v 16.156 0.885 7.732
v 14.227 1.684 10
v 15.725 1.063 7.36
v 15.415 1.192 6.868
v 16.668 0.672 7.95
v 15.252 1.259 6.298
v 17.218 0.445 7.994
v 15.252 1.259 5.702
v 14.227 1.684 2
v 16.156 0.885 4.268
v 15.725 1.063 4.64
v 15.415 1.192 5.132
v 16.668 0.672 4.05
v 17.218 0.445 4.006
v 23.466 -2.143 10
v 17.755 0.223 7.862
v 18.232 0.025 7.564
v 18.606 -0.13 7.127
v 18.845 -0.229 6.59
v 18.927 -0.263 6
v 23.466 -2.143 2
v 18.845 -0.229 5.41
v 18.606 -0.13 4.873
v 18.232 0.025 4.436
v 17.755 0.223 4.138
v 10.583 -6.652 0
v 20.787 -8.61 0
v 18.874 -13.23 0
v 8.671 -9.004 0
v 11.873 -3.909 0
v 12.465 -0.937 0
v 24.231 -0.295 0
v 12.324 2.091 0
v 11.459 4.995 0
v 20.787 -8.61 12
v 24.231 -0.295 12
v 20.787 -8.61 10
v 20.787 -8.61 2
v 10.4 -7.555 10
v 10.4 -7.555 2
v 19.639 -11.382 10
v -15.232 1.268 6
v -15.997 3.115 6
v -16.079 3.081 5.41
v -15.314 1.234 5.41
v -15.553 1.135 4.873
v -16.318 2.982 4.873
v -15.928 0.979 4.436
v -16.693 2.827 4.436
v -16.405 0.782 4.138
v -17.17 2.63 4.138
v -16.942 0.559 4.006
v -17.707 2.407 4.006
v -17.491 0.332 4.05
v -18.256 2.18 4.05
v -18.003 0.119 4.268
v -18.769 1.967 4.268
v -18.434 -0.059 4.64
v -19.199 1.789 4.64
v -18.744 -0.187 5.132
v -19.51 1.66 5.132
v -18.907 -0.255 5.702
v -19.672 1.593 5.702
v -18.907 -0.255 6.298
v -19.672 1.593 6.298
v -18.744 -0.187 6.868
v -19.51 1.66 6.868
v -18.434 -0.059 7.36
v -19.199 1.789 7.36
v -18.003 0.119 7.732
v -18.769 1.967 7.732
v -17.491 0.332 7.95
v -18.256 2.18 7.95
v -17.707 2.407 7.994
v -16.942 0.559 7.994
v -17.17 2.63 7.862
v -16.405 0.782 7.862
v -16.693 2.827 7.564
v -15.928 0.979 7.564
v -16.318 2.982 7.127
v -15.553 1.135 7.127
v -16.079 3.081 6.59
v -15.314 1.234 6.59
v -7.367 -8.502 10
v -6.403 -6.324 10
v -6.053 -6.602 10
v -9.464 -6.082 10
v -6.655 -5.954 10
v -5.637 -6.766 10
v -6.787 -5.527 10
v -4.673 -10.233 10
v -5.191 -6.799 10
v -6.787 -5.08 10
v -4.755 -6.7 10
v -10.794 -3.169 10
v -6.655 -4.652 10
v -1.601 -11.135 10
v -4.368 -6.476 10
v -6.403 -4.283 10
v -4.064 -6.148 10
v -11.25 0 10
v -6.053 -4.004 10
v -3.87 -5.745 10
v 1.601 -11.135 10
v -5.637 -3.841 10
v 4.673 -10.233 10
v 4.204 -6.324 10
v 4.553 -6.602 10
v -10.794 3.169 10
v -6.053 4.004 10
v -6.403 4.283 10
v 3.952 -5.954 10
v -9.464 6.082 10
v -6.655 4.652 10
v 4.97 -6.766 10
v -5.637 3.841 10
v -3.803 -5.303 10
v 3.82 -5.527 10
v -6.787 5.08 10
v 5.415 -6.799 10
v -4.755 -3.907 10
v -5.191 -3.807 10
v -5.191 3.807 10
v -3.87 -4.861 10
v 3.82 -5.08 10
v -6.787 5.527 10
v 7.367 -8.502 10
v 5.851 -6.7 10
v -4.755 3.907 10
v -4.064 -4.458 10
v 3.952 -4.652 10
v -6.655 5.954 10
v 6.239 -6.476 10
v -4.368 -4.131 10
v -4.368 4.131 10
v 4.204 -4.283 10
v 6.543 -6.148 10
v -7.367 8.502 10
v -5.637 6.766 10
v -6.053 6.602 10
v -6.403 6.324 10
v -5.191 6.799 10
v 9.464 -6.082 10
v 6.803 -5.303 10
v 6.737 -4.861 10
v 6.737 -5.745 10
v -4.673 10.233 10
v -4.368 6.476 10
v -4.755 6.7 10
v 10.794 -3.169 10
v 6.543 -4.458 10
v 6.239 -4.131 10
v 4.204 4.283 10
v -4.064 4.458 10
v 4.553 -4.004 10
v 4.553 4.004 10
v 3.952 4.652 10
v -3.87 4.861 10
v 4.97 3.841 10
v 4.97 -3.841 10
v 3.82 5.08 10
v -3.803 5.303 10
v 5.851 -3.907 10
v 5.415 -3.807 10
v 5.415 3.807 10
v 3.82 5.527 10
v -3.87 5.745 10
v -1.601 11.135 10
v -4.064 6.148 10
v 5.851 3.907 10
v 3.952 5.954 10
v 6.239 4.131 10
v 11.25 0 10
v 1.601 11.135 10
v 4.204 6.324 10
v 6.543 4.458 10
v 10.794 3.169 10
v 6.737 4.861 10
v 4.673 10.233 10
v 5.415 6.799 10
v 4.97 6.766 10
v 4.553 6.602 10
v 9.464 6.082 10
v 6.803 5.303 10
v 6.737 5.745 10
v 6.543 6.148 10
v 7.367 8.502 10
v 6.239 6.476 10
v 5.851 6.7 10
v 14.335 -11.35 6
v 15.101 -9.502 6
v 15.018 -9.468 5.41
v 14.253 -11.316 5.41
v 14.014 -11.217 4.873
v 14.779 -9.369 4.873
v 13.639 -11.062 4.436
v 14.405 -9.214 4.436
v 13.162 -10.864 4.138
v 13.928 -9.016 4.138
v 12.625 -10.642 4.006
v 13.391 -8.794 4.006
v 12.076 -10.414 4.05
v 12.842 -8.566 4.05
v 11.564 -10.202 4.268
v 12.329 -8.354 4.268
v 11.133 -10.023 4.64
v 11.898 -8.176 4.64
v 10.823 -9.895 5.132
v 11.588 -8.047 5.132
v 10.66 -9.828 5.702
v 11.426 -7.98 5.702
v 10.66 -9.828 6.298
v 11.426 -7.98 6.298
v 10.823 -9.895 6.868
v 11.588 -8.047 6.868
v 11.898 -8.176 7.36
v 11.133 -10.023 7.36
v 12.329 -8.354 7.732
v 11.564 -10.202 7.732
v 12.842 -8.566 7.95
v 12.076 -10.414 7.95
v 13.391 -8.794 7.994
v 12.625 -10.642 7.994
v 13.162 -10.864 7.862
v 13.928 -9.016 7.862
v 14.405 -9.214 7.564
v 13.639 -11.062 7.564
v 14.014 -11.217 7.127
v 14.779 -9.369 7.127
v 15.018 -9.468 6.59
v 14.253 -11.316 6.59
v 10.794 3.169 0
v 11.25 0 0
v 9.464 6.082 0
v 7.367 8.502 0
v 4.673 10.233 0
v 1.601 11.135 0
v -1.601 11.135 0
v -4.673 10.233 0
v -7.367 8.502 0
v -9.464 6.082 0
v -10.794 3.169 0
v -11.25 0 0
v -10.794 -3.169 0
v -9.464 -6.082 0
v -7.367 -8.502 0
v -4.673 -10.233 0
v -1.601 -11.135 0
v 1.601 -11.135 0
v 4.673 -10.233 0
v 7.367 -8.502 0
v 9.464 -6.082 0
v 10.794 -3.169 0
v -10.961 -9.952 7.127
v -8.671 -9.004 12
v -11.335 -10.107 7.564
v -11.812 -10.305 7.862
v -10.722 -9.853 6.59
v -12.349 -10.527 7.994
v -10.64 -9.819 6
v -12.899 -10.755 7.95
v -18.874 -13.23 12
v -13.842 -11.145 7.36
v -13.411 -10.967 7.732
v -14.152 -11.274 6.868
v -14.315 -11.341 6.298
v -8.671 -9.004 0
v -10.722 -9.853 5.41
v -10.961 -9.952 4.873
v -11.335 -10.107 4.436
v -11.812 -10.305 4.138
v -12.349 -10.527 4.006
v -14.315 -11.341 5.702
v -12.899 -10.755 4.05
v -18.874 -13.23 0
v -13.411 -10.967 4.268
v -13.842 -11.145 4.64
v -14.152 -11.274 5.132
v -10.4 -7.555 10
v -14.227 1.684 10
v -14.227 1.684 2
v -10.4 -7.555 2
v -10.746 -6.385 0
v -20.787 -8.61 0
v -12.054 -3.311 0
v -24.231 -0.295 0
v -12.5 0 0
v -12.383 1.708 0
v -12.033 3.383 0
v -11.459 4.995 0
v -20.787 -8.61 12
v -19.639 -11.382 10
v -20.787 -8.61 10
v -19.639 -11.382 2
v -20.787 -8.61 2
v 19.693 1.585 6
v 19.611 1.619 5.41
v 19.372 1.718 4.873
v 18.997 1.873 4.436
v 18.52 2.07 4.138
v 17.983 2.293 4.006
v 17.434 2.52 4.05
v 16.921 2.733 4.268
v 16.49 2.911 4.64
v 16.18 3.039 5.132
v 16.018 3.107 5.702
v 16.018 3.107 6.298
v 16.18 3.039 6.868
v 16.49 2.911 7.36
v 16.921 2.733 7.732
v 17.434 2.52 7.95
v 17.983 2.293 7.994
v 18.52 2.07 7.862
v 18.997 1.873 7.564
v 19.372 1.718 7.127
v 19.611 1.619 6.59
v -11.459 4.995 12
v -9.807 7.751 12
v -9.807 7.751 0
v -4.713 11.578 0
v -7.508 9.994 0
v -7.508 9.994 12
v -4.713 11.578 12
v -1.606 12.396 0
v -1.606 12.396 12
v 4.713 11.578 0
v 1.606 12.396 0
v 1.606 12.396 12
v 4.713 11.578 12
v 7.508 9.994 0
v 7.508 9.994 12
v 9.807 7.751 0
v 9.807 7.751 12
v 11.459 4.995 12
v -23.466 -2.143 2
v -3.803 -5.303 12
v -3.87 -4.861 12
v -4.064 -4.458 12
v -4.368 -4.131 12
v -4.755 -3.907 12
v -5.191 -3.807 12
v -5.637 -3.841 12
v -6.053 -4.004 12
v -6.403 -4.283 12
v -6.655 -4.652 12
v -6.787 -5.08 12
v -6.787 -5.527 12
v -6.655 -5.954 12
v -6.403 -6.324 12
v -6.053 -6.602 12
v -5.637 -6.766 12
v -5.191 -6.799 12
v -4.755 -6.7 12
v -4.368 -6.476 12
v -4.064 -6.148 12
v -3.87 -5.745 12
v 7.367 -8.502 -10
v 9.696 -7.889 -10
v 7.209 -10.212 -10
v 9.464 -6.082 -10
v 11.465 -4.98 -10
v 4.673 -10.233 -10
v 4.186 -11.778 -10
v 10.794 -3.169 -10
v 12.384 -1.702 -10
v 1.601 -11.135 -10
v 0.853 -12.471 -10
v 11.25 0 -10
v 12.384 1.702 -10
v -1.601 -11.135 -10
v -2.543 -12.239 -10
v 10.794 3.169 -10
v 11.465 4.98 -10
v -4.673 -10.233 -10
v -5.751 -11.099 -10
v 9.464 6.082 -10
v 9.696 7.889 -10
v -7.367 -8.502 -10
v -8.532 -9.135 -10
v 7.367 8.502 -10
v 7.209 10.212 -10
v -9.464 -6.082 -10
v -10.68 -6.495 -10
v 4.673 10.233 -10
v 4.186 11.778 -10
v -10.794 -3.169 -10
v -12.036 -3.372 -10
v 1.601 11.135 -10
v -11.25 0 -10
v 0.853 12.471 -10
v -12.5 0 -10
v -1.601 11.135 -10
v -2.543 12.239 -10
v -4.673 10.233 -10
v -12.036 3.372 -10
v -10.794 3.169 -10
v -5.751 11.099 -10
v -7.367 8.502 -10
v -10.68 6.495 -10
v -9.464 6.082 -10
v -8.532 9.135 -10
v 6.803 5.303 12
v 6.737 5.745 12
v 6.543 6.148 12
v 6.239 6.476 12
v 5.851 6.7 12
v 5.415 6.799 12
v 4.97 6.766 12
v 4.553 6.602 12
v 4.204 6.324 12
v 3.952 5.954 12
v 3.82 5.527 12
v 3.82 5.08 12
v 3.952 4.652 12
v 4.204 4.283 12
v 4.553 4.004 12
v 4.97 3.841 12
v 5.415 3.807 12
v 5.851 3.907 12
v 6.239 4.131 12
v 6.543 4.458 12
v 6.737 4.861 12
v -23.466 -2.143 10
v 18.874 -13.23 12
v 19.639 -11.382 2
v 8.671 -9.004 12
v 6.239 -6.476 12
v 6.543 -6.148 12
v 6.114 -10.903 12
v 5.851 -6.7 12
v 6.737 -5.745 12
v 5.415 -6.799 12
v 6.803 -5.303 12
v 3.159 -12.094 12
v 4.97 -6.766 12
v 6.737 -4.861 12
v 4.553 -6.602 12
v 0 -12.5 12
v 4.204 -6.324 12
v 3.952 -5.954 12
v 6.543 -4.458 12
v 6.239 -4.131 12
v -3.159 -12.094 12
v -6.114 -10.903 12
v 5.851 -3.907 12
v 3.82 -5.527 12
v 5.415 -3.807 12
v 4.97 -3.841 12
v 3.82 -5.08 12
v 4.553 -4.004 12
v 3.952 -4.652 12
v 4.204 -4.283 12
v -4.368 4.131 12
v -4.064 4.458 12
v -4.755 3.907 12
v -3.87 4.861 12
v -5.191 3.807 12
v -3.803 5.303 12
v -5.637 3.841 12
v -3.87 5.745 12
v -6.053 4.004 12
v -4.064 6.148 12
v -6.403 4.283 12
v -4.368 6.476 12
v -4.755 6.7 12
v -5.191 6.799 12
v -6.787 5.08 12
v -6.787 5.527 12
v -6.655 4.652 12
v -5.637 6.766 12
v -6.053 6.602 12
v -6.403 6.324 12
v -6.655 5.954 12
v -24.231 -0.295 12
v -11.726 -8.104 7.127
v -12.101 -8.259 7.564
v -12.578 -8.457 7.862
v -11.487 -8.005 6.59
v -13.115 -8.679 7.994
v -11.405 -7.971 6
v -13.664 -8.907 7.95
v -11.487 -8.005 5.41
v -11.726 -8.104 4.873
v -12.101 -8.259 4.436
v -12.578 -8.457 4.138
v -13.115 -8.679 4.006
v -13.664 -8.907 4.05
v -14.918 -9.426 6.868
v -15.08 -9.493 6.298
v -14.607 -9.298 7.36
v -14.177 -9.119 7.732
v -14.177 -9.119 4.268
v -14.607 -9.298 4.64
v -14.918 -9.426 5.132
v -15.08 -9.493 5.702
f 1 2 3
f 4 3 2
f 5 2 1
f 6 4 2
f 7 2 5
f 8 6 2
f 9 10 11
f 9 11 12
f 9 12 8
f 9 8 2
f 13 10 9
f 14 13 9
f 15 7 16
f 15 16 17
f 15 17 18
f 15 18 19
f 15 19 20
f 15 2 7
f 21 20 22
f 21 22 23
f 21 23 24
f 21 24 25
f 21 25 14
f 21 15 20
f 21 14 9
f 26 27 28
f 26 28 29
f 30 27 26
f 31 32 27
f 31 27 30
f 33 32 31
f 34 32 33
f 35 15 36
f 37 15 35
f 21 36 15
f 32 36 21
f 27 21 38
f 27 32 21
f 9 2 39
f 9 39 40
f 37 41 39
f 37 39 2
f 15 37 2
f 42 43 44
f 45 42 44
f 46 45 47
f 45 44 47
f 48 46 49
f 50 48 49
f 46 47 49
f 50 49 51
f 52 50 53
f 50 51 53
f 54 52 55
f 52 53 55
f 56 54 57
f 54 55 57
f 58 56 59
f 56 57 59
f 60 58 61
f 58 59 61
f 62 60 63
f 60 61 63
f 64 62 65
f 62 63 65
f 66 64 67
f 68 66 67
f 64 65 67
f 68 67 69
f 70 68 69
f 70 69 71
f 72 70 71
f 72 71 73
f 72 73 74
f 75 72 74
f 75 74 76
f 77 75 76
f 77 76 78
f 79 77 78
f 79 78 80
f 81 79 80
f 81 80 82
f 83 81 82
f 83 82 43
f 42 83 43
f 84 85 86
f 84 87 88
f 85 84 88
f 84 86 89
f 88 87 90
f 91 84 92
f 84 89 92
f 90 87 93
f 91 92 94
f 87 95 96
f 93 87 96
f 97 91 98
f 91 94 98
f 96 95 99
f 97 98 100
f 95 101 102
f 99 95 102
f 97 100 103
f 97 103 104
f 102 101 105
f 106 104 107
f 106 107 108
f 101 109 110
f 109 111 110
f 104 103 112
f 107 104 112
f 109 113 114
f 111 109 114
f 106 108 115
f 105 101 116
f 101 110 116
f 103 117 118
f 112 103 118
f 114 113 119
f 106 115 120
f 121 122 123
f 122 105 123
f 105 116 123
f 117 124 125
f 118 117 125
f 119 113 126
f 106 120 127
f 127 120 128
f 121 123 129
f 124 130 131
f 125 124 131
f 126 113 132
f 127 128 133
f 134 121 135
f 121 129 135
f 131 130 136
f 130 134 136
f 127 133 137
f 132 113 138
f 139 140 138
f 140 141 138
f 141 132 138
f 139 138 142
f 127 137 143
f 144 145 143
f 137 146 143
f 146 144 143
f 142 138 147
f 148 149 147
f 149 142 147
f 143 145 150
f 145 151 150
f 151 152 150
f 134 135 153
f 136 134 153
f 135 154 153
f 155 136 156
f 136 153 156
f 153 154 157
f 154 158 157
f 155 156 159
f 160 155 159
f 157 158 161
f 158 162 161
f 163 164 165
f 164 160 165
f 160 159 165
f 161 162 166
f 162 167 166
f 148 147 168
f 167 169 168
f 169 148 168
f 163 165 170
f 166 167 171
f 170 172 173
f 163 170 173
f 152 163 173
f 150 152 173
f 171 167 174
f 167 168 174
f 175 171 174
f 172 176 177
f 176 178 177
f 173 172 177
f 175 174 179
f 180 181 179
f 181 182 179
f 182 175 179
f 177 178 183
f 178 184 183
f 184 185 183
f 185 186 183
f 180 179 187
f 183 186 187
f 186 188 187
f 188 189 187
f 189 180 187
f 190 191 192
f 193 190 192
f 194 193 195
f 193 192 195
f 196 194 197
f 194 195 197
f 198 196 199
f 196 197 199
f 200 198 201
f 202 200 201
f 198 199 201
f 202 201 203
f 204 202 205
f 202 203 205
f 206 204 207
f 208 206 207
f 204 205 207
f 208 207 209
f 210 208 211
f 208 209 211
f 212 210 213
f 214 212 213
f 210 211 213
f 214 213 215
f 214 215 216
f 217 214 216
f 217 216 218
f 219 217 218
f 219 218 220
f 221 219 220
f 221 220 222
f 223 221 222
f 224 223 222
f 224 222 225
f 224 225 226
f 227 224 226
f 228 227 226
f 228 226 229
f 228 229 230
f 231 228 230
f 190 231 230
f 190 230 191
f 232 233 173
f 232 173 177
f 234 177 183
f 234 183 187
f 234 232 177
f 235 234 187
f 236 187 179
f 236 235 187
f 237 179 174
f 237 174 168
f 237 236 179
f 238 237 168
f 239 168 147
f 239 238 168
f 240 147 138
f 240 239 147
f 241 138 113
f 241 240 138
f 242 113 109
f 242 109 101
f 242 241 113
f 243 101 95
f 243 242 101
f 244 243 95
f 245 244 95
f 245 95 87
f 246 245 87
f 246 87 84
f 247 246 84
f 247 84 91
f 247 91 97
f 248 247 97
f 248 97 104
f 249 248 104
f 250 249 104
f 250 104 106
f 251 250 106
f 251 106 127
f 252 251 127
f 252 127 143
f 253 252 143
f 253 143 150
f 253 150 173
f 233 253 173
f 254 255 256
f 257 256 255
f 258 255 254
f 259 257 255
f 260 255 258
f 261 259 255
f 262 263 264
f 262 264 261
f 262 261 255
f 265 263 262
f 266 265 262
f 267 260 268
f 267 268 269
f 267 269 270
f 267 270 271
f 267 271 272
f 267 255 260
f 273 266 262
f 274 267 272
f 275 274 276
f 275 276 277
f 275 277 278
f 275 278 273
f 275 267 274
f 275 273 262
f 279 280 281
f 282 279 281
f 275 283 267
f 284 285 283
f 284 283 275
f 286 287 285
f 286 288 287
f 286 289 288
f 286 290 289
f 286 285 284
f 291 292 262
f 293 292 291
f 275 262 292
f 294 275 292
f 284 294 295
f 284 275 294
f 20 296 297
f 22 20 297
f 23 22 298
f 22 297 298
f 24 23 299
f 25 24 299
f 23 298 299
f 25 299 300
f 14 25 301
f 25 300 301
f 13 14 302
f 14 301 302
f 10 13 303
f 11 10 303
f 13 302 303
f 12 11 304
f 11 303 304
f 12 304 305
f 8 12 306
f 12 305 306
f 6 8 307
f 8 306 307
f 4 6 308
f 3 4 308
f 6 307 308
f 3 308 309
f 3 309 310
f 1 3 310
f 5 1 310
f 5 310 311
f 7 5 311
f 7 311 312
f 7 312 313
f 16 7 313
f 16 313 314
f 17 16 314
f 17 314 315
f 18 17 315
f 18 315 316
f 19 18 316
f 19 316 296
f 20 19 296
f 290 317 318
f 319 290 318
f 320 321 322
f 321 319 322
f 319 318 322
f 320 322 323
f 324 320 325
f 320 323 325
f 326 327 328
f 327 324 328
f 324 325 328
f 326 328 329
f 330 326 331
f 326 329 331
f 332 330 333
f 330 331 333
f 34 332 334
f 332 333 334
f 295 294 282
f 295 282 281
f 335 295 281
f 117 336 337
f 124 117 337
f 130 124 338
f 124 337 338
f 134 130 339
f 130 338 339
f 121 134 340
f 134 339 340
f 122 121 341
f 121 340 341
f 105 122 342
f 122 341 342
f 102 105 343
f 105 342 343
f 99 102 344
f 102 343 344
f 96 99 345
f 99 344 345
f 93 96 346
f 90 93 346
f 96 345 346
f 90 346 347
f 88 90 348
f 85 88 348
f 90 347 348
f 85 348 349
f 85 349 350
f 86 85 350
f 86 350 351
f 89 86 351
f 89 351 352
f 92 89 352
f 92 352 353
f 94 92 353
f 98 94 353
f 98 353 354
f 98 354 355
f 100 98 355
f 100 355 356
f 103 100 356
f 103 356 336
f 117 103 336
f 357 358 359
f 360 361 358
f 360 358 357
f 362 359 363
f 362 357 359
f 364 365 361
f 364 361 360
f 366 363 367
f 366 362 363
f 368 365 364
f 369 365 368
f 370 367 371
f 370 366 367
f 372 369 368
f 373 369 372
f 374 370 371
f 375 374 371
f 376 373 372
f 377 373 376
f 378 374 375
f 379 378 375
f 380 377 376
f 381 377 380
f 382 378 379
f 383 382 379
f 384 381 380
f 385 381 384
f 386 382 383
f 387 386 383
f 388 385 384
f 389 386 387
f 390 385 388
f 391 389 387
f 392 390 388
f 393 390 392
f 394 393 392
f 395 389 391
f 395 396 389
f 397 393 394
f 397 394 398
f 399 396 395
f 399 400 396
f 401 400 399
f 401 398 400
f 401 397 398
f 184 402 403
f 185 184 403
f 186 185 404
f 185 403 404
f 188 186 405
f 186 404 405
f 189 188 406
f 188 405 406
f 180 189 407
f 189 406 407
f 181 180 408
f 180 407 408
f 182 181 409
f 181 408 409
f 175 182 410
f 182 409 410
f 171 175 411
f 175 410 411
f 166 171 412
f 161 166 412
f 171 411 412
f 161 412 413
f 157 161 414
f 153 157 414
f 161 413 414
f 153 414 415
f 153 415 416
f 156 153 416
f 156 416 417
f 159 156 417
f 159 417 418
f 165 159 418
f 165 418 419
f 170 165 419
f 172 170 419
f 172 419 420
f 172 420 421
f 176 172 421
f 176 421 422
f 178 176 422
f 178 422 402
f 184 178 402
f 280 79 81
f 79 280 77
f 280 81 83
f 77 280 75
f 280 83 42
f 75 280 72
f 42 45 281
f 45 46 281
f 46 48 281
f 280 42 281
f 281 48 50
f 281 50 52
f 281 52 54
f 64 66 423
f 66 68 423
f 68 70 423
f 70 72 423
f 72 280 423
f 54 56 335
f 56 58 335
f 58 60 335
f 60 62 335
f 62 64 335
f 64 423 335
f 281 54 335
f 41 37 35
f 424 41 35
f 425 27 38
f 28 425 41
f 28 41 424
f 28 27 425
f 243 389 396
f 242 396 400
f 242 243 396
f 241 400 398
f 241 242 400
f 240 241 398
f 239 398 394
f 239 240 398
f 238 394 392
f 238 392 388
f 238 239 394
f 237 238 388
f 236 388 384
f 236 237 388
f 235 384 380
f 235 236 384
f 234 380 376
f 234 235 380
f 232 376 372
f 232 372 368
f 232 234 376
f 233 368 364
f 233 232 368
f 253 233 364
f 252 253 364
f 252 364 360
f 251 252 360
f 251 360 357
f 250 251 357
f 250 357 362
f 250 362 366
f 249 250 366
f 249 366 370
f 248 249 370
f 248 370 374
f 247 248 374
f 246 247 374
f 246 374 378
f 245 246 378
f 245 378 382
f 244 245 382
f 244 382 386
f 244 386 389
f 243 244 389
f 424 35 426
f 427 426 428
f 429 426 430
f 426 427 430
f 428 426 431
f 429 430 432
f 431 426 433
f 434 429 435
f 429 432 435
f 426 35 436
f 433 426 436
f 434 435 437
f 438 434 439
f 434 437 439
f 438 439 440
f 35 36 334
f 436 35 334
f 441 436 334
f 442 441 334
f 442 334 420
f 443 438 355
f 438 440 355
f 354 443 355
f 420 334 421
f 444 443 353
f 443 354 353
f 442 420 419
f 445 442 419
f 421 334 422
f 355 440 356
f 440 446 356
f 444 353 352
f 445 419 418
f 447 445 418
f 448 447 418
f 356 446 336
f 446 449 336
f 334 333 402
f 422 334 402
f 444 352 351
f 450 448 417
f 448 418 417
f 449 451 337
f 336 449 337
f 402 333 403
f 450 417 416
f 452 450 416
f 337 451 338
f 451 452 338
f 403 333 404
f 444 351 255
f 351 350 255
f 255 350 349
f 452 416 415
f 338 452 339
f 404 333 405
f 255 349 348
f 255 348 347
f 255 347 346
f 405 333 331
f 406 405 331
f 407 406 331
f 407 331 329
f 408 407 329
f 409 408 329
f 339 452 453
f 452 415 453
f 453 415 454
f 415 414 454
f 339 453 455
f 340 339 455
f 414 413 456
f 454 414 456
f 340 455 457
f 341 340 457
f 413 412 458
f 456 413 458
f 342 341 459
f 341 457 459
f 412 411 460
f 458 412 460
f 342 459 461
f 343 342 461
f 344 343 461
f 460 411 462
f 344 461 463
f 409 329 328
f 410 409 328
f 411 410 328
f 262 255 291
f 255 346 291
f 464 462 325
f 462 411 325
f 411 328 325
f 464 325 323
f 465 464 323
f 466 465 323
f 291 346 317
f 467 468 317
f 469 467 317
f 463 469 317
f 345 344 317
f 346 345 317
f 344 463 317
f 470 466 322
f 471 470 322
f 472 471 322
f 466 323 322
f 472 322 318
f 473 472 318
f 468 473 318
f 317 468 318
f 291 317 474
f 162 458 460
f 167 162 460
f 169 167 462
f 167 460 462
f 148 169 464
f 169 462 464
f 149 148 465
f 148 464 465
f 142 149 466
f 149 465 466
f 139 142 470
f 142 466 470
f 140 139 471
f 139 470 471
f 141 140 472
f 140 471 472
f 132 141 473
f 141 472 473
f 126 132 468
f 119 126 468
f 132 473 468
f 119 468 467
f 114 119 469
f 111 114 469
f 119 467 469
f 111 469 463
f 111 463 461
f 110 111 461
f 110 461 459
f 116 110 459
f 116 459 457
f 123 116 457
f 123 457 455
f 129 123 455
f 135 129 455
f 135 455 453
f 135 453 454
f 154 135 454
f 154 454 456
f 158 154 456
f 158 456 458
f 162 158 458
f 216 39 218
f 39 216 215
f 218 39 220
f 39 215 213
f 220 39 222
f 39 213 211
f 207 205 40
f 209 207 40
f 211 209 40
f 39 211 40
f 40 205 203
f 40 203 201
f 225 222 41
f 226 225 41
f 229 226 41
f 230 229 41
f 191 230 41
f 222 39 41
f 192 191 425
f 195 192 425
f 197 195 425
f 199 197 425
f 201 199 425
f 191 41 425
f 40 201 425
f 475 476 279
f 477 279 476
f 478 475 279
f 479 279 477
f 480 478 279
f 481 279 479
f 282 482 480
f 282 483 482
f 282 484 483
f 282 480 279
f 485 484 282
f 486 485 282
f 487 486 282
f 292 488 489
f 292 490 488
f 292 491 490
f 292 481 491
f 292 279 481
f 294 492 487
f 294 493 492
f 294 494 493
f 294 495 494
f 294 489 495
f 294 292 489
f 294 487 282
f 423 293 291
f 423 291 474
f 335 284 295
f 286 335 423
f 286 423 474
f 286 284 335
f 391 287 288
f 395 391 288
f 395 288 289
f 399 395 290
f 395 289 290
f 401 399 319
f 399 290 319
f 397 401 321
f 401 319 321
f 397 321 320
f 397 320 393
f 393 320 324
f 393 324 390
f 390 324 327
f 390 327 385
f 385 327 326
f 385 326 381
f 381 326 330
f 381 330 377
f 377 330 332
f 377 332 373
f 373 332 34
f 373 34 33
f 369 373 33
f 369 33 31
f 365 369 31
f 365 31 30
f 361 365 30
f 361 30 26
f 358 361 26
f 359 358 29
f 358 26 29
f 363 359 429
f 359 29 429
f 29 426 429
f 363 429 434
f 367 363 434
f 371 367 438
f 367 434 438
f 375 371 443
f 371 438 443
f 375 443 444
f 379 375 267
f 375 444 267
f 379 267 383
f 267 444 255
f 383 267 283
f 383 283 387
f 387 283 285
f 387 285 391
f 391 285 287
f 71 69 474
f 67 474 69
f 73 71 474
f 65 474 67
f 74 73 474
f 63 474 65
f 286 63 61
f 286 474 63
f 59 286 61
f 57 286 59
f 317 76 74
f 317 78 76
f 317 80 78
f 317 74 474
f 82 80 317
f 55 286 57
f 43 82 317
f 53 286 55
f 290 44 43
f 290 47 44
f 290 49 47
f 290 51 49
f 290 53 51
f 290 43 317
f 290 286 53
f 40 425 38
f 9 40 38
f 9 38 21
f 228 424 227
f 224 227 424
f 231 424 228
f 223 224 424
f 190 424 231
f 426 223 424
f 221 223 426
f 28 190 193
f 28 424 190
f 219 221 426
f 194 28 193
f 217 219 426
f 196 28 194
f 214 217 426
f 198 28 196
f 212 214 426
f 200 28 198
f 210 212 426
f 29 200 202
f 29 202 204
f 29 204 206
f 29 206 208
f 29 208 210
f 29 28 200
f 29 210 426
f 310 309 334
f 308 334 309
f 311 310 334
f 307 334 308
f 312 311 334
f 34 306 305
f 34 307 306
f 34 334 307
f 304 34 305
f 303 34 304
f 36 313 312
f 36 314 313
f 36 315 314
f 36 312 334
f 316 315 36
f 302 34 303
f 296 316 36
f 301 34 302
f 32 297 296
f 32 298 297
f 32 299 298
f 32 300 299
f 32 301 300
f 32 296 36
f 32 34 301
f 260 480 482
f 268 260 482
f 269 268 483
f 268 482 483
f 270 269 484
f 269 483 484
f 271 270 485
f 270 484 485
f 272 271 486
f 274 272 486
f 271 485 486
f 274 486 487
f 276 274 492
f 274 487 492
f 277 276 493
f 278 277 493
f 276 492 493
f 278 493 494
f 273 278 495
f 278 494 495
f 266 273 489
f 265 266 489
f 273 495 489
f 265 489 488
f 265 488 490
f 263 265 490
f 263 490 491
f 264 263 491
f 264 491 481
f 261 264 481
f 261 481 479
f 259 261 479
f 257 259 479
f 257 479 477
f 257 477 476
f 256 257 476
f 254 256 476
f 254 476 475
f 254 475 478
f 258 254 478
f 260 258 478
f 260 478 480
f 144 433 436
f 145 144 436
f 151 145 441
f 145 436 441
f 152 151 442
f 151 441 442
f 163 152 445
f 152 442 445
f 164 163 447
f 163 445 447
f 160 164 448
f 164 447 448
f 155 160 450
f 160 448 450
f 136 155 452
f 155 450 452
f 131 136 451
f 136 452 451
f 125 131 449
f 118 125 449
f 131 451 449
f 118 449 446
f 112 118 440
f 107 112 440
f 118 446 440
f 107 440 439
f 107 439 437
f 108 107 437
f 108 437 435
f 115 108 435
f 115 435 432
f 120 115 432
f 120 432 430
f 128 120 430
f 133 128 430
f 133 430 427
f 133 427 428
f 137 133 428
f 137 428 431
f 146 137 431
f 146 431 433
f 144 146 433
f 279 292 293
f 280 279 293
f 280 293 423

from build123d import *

# Parameters (mm, degrees)
SKETCH1_R           = 12.5
BOSS_EXTRUDE2_DEPTH = 12
SKETCH1_5_R         = 11.25
CUT_EXTRUDE1_DEPTH  = 10
CUT_EXTRUDE2_REACH  = 14
SKETCH4_R           = 1.5
BOSS_EXTRUDE3_DEPTH = 12
SKETCH11_W          = 8
SKETCH11_H          = 10
CUT_EXTRUDE6_DEPTH  = 10
SKETCH12_R          = 2
CUT_EXTRUDE7_DEPTH  = 14
SKETCH13_R          = 2
CUT_EXTRUDE8_DEPTH  = 14
SKETCH14_R          = 12.5
SKETCH14_R_2        = 11.25
BOSS_EXTRUDE4_DEPTH = 10


with BuildPart() as part:
    # Sketch1 → Boss-Extrude2 (new body)
    with BuildSketch(Plane.XY):
        Circle(SKETCH1_R)
    extrude(amount=BOSS_EXTRUDE2_DEPTH)

    # Sketch1<5> → Cut-Extrude1 (cut)
    with BuildSketch(Plane.XY):
        Circle(SKETCH1_5_R)
    extrude(amount=CUT_EXTRUDE1_DEPTH, mode=Mode.SUBTRACT)

    # Sketch4 → Cut-Extrude2 (cut, up to next)
    with BuildSketch(Plane.XY.offset(12), mode=Mode.PRIVATE) as cut_extrude2_sk1:
        with Locations((5.303300859, 5.303300859)):
            Circle(SKETCH4_R)
    cut_extrude2_tool1 = extrude(cut_extrude2_sk1.sketch, amount=-CUT_EXTRUDE2_REACH, mode=Mode.PRIVATE) & part.part
    add(cut_extrude2_tool1.solids().sort_by_distance((5.303301, 5.303301, 12))[0], mode=Mode.SUBTRACT)
    # Sketch4 → Cut-Extrude2 (cut, up to next)
    with BuildSketch(Plane.XY.offset(12), mode=Mode.PRIVATE) as cut_extrude2_sk2:
        with Locations((-5.303300859, 5.303300859)):
            Circle(SKETCH4_R)
    cut_extrude2_tool2 = extrude(cut_extrude2_sk2.sketch, amount=-CUT_EXTRUDE2_REACH, mode=Mode.PRIVATE) & part.part
    add(cut_extrude2_tool2.solids().sort_by_distance((-5.303301, 5.303301, 12))[0], mode=Mode.SUBTRACT)
    # Sketch4 → Cut-Extrude2 (cut, up to next)
    with BuildSketch(Plane.XY.offset(12), mode=Mode.PRIVATE) as cut_extrude2_sk3:
        with Locations((-5.303300859, -5.303300859)):
            Circle(SKETCH4_R)
    cut_extrude2_tool3 = extrude(cut_extrude2_sk3.sketch, amount=-CUT_EXTRUDE2_REACH, mode=Mode.PRIVATE) & part.part
    add(cut_extrude2_tool3.solids().sort_by_distance((-5.303301, -5.303301, 12))[0], mode=Mode.SUBTRACT)
    # Sketch4 → Cut-Extrude2 (cut, up to next)
    with BuildSketch(Plane.XY.offset(12), mode=Mode.PRIVATE) as cut_extrude2_sk4:
        with Locations((5.303300859, -5.303300859)):
            Circle(SKETCH4_R)
    cut_extrude2_tool4 = extrude(cut_extrude2_sk4.sketch, amount=-CUT_EXTRUDE2_REACH, mode=Mode.PRIVATE) & part.part
    add(cut_extrude2_tool4.solids().sort_by_distance((5.303301, -5.303301, 12))[0], mode=Mode.SUBTRACT)

    # Sketch10 → Boss-Extrude3 (add)
    with BuildSketch(Plane.XY):
        with BuildLine():
            Line((18.87387232, -13.229774891), (8.670952565, -9.003587153))
            ThreePointArc((8.670952565, -9.003587153), (12.259311424, -2.441164357), (11.458506302, 4.995261088))
            Line((11.458506302, 4.995261088), (24.231440373, -0.295461436))
            Line((24.231440373, -0.295461436), (20.787289482, -8.610377228))
            Line((20.787289482, -8.610377228), (18.87387232, -13.229774891))
        make_face()
        with BuildLine():
            Line((-24.231440373, -0.295461436), (-11.458506302, 4.995261088))
            ThreePointArc((-11.458506302, 4.995261088), (-12.259311424, -2.441164357), (-8.670952565, -9.003587153))
            Line((-8.670952565, -9.003587153), (-18.87387232, -13.229774891))
            Line((-18.87387232, -13.229774891), (-20.787289482, -8.610377228))
            Line((-20.787289482, -8.610377228), (-24.231440373, -0.295461436))
        make_face()
    extrude(amount=BOSS_EXTRUDE3_DEPTH)

    # Sketch11 → Cut-Extrude6 (cut)
    with BuildSketch(Plane(origin=(20.787289482, -8.610377228, 0), x_dir=(0, 0, -1), z_dir=(0.923879533, -0.382683432, 0))):
        with Locations((-6, 2)):
            Rectangle(SKETCH11_W, SKETCH11_H)
    cut_extrude6 = extrude(amount=-CUT_EXTRUDE6_DEPTH, mode=Mode.SUBTRACT)

    # Sketch12 → Cut-Extrude7 (cut)
    with BuildSketch(Plane(origin=(3.444150891, 8.314915793, 0), x_dir=(0.923879533, -0.382683432, 0), z_dir=(0.382683432, 0.923879533, 0))):
        with Locations((15.587337893, -6)):
            Circle(SKETCH12_R)
    extrude(amount=-CUT_EXTRUDE7_DEPTH, mode=Mode.SUBTRACT)

    # Mirror5: Cut-Extrude6 across plane
    add(cut_extrude6.mirror(Plane(origin=(0, 0, 0), x_dir=(0, 0, 1), z_dir=(1, 0, 0))), mode=Mode.SUBTRACT)

    # Sketch13 → Cut-Extrude8 (cut)
    with BuildSketch(Plane(origin=(-3.444150891, 8.314915793, 0), x_dir=(0.923879533, 0.382683432, 0), z_dir=(-0.382683432, 0.923879533, 0))):
        with Locations((-15.587337893, -6)):
            Circle(SKETCH13_R)
    extrude(amount=-CUT_EXTRUDE8_DEPTH, mode=Mode.SUBTRACT)

    # Sketch14 → Boss-Extrude4 (add)
    with BuildSketch(Plane(origin=(0, 0, 0), x_dir=(-1, 0, 0), z_dir=(0, 0, -1))):
        Circle(SKETCH14_R)
        Circle(SKETCH14_R_2, mode=Mode.SUBTRACT)
    extrude(amount=BOSS_EXTRUDE4_DEPTH)


solid = part.part
